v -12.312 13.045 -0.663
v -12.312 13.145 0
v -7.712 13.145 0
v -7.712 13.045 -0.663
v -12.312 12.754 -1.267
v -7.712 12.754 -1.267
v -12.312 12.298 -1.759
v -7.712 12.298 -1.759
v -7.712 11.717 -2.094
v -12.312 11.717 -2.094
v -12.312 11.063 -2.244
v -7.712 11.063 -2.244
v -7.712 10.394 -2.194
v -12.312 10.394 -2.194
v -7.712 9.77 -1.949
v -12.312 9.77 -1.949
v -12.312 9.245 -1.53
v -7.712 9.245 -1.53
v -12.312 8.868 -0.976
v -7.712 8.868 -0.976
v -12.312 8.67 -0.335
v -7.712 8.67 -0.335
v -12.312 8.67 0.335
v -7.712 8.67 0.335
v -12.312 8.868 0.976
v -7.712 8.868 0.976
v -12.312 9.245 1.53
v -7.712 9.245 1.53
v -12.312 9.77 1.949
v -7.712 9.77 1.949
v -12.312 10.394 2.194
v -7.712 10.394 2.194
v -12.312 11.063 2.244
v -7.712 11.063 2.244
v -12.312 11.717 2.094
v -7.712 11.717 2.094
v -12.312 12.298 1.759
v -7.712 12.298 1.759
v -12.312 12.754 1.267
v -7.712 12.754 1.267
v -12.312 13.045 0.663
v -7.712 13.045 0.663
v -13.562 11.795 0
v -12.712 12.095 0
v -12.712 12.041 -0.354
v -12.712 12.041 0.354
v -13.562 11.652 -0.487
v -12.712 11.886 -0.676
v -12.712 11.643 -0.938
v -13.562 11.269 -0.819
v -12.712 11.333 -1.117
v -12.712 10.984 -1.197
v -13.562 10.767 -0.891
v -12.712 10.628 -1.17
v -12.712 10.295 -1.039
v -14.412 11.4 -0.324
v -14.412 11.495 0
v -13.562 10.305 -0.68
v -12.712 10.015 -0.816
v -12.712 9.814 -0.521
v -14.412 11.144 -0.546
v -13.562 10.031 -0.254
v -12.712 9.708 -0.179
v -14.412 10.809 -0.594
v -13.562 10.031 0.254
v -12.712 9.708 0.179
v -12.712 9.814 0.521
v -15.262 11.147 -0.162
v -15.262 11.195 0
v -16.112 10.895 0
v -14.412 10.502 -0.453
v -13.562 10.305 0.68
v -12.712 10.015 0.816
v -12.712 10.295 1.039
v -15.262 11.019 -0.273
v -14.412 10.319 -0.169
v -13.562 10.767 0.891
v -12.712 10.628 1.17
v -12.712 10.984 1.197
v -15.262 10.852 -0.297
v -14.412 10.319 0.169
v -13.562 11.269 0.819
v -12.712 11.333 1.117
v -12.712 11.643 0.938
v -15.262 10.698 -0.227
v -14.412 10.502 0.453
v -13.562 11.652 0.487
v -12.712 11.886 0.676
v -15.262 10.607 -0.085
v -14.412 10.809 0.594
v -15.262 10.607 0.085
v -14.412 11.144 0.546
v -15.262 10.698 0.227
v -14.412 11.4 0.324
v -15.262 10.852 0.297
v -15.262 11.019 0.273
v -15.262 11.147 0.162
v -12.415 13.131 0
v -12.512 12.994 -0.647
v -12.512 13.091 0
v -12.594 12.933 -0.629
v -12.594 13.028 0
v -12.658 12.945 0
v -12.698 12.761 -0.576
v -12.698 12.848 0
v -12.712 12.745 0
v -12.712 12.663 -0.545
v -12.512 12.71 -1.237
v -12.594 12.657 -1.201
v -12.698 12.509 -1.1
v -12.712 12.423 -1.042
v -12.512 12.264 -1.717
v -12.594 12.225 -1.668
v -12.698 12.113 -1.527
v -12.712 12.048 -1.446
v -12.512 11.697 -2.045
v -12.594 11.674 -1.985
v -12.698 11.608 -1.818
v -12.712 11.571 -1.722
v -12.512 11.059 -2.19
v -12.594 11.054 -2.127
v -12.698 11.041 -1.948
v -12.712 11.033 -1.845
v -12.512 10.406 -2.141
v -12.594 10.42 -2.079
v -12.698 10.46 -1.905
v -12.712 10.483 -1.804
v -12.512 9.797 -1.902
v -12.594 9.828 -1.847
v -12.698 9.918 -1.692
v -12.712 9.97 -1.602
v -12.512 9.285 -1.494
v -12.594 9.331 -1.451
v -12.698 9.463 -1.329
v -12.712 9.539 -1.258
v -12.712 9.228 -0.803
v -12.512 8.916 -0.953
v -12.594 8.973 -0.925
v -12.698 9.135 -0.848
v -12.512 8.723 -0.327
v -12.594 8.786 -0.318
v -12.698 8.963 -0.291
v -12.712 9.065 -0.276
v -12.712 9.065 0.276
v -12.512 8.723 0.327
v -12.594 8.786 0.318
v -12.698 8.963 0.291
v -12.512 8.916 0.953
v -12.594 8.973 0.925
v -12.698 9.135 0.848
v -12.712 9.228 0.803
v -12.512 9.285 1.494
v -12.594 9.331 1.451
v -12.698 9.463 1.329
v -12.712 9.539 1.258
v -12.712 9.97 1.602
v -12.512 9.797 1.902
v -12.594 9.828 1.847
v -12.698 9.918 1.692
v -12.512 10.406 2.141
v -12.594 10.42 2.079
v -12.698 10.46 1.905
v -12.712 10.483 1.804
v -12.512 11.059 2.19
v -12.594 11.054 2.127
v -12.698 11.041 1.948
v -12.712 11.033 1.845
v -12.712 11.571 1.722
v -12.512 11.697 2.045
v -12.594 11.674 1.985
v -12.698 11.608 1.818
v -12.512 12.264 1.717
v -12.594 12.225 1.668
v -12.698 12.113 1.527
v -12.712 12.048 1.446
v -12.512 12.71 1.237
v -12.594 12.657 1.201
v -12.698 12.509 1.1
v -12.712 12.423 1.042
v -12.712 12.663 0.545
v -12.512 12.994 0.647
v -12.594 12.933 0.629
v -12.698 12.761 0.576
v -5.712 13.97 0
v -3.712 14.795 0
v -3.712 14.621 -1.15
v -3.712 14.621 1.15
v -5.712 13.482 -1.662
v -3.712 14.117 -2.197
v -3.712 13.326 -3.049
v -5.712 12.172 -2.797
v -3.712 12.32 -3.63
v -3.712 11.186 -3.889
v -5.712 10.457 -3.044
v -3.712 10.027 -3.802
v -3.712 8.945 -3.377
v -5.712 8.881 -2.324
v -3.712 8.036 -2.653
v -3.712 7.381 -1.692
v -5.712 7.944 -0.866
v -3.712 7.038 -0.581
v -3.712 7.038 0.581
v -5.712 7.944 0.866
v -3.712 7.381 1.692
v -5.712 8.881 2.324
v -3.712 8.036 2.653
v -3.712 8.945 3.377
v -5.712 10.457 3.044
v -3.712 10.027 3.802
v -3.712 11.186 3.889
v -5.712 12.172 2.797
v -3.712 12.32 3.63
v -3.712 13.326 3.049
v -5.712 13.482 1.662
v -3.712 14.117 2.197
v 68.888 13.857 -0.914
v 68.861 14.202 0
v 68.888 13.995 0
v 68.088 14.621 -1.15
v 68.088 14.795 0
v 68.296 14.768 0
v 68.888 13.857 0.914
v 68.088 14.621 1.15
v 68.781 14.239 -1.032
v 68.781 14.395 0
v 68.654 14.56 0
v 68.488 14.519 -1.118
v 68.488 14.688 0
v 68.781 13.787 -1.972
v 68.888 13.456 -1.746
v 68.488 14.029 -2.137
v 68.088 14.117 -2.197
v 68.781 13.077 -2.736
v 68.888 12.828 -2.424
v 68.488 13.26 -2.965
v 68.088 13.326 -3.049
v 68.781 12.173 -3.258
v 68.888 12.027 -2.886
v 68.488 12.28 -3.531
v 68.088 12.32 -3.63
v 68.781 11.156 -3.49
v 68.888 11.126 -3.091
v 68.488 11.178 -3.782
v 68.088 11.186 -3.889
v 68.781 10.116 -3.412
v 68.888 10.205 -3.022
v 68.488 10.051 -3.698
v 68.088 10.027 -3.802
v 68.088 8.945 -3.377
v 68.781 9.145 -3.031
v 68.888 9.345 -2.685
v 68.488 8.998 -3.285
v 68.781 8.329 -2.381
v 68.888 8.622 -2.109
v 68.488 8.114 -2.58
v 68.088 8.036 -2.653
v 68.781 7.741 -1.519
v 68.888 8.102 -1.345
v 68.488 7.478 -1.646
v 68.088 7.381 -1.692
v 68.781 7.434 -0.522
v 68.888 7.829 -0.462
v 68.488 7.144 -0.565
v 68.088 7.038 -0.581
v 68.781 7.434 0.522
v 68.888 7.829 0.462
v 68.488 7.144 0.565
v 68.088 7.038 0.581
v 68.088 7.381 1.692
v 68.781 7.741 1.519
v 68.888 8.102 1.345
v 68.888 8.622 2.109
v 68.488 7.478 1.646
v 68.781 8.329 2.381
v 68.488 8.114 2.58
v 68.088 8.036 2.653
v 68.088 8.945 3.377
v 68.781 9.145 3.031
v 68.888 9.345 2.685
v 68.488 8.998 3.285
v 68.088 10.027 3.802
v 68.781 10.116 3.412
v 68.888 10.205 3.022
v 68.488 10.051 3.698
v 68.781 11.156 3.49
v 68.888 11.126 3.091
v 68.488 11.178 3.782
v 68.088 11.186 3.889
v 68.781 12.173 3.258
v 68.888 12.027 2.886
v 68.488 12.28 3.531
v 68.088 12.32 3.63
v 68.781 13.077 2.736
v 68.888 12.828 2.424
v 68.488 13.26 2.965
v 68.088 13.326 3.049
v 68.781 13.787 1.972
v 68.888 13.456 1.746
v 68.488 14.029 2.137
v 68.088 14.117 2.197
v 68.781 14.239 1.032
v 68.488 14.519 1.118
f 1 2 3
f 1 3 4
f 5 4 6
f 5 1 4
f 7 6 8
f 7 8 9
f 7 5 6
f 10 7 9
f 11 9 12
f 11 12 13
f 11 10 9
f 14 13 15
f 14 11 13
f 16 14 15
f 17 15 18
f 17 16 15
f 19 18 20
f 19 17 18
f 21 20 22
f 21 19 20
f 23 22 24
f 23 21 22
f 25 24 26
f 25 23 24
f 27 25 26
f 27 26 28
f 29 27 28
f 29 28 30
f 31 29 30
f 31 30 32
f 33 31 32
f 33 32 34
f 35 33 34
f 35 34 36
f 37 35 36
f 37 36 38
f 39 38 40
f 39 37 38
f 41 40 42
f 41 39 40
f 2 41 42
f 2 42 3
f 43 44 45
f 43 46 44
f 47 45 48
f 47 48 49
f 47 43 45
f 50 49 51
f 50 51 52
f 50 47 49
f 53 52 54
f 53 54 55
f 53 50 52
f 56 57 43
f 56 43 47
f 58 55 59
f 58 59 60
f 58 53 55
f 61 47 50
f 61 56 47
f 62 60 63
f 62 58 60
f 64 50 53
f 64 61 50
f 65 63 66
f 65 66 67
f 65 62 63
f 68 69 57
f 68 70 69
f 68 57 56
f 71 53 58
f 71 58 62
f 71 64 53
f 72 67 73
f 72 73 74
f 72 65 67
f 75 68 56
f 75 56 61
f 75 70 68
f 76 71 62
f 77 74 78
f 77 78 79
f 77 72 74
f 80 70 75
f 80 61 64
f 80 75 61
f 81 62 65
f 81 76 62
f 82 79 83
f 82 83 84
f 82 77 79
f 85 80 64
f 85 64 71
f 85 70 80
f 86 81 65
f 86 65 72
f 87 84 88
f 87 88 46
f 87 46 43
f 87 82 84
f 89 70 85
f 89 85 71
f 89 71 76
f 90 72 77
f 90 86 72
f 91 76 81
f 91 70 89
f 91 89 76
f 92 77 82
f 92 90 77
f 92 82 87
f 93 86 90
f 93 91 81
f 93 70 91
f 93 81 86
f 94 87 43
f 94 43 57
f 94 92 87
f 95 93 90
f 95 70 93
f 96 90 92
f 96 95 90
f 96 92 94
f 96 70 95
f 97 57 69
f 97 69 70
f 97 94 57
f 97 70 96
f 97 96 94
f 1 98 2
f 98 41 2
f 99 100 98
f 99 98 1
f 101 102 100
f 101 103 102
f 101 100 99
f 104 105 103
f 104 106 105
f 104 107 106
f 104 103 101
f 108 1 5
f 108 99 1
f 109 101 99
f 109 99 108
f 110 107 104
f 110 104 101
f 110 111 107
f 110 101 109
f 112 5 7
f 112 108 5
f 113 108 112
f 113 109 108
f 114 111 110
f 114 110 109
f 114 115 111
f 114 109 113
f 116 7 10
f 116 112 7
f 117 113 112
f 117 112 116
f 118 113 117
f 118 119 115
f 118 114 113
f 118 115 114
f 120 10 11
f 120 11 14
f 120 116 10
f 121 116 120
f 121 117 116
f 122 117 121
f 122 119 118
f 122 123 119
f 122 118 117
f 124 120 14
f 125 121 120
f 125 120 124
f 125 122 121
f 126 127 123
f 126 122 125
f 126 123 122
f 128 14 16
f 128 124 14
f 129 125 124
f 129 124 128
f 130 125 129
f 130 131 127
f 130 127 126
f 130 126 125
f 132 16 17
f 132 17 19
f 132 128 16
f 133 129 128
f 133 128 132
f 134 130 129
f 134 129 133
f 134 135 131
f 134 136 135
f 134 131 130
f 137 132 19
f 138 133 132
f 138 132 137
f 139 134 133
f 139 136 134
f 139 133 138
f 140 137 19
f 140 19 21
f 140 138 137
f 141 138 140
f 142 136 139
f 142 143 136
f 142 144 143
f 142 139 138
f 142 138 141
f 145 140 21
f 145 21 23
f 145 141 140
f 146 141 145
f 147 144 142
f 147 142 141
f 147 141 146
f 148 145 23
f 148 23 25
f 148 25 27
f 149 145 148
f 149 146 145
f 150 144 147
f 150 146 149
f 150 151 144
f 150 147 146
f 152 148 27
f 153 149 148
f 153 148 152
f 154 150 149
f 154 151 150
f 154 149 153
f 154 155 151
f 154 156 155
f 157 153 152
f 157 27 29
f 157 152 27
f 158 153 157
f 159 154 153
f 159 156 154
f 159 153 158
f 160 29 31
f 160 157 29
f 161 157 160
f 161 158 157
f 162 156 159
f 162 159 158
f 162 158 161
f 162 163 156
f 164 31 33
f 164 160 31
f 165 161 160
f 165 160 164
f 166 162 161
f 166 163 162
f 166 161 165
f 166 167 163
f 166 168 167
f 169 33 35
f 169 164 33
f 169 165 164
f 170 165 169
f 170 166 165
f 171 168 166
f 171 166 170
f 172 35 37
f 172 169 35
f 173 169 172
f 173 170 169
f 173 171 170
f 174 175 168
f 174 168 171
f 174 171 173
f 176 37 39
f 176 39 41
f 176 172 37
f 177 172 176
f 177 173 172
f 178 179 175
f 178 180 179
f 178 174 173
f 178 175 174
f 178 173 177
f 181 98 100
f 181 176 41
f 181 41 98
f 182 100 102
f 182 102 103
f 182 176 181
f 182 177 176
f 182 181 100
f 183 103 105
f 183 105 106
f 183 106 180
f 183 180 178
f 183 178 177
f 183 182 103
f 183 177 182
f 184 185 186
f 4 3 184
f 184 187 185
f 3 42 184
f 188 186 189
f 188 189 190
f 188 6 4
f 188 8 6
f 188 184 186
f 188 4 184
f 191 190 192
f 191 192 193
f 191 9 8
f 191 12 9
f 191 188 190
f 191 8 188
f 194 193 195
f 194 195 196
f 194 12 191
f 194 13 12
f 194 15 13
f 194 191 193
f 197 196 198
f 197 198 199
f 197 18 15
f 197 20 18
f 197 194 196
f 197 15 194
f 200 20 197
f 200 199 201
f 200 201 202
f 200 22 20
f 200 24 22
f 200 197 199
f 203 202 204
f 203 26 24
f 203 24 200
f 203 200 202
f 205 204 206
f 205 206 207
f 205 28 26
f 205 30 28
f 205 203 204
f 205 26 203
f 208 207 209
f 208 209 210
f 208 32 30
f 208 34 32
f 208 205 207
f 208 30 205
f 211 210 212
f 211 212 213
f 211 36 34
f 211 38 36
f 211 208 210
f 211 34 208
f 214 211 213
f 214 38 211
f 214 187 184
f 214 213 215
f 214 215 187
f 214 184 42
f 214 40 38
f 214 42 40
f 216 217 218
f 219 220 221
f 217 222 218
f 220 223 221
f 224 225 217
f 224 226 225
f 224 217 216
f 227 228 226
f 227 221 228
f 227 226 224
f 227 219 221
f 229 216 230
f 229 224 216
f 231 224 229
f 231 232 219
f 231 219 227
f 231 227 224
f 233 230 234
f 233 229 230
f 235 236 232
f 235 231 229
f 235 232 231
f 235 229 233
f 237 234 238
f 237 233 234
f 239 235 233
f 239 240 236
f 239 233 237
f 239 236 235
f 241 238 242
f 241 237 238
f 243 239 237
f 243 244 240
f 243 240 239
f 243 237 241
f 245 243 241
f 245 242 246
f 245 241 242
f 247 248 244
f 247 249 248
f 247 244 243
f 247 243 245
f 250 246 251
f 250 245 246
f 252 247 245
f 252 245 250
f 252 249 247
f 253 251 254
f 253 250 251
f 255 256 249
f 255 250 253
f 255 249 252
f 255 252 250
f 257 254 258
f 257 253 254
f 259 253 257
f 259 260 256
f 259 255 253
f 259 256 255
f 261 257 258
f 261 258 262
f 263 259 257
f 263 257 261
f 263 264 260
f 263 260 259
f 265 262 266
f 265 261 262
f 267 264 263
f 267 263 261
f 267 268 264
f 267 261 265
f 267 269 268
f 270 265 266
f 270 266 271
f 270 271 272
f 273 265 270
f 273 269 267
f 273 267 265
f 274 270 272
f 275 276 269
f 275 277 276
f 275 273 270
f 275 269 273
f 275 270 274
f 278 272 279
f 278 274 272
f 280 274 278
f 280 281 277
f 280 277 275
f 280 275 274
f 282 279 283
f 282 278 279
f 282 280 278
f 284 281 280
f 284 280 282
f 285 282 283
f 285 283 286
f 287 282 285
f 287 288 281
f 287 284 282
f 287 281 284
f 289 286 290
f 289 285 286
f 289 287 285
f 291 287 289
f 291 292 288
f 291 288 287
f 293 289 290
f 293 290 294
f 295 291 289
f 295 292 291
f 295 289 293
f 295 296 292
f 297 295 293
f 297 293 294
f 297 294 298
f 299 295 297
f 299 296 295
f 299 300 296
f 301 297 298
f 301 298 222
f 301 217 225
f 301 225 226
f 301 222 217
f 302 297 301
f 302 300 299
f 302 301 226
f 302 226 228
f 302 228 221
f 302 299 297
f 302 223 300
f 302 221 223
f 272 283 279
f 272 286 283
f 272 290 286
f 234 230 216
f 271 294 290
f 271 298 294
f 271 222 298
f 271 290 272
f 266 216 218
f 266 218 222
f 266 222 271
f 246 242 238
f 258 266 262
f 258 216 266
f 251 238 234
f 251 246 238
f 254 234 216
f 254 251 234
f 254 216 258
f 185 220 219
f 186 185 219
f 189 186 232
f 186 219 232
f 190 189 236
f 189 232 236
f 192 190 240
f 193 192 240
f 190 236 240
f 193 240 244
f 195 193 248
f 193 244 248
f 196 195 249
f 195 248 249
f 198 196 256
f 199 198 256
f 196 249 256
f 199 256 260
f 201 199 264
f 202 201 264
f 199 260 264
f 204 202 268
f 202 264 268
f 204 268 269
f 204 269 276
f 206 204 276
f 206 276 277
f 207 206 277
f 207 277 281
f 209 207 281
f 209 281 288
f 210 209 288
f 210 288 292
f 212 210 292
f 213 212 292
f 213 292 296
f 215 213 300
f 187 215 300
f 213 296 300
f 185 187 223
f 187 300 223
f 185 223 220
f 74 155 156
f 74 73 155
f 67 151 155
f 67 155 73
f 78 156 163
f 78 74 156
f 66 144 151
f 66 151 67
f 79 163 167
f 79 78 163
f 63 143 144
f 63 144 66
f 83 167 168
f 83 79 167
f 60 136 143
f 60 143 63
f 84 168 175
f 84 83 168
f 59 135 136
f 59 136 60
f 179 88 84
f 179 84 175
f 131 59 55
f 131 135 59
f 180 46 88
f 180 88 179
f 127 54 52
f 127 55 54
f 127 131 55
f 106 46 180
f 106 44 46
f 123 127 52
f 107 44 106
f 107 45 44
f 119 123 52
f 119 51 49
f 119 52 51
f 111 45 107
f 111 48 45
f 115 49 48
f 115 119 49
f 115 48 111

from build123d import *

# Parameters (mm, degrees)
F0_W = 72.6
F0_H = 3.9
F2_R = 0.8
F3_R = 0.4


with BuildPart() as f1:
    # F0 (on Top) → F1 (revolve)
    with BuildSketch(Plane.XY):
        Polygon((-12.7115285009, 12.0947610609), (-16.1115285009, 10.8947610609), (-12.7115285009, 10.8947610609), align=None)
        Polygon((-7.7115285009, 10.8947610609), (-7.7115285009, 13.1447610609), (-12.7115285009, 13.1447610609), (-12.7115285009, 12.0947610609), (-12.7115285009, 10.8947610609), align=None)
        Polygon((-3.7115285009, 10.8947610609), (-3.7115285009, 14.7947610609), (-7.7115285009, 13.1447610609), (-7.7115285009, 10.8947610609), align=None)
        with Locations((32.5884714991, 12.8447610609)):
            Rectangle(F0_W, F0_H)
    revolve(axis=Axis((26.3884714991, 10.8947610609, 0), (-1, 0, 0)))

    # F2
    f2_edges = [f1.edges().sort_by_distance(p)[0] for p in [
        (68.888471, 6.994761, 0),
    ]]
    fillet(f2_edges, radius=F2_R)

    # F3
    f3_edges = [f1.edges().sort_by_distance(p)[0] for p in [
        (-12.711529, 8.644761, 0),
    ]]
    fillet(f3_edges, radius=F3_R)


solid = f1.part
